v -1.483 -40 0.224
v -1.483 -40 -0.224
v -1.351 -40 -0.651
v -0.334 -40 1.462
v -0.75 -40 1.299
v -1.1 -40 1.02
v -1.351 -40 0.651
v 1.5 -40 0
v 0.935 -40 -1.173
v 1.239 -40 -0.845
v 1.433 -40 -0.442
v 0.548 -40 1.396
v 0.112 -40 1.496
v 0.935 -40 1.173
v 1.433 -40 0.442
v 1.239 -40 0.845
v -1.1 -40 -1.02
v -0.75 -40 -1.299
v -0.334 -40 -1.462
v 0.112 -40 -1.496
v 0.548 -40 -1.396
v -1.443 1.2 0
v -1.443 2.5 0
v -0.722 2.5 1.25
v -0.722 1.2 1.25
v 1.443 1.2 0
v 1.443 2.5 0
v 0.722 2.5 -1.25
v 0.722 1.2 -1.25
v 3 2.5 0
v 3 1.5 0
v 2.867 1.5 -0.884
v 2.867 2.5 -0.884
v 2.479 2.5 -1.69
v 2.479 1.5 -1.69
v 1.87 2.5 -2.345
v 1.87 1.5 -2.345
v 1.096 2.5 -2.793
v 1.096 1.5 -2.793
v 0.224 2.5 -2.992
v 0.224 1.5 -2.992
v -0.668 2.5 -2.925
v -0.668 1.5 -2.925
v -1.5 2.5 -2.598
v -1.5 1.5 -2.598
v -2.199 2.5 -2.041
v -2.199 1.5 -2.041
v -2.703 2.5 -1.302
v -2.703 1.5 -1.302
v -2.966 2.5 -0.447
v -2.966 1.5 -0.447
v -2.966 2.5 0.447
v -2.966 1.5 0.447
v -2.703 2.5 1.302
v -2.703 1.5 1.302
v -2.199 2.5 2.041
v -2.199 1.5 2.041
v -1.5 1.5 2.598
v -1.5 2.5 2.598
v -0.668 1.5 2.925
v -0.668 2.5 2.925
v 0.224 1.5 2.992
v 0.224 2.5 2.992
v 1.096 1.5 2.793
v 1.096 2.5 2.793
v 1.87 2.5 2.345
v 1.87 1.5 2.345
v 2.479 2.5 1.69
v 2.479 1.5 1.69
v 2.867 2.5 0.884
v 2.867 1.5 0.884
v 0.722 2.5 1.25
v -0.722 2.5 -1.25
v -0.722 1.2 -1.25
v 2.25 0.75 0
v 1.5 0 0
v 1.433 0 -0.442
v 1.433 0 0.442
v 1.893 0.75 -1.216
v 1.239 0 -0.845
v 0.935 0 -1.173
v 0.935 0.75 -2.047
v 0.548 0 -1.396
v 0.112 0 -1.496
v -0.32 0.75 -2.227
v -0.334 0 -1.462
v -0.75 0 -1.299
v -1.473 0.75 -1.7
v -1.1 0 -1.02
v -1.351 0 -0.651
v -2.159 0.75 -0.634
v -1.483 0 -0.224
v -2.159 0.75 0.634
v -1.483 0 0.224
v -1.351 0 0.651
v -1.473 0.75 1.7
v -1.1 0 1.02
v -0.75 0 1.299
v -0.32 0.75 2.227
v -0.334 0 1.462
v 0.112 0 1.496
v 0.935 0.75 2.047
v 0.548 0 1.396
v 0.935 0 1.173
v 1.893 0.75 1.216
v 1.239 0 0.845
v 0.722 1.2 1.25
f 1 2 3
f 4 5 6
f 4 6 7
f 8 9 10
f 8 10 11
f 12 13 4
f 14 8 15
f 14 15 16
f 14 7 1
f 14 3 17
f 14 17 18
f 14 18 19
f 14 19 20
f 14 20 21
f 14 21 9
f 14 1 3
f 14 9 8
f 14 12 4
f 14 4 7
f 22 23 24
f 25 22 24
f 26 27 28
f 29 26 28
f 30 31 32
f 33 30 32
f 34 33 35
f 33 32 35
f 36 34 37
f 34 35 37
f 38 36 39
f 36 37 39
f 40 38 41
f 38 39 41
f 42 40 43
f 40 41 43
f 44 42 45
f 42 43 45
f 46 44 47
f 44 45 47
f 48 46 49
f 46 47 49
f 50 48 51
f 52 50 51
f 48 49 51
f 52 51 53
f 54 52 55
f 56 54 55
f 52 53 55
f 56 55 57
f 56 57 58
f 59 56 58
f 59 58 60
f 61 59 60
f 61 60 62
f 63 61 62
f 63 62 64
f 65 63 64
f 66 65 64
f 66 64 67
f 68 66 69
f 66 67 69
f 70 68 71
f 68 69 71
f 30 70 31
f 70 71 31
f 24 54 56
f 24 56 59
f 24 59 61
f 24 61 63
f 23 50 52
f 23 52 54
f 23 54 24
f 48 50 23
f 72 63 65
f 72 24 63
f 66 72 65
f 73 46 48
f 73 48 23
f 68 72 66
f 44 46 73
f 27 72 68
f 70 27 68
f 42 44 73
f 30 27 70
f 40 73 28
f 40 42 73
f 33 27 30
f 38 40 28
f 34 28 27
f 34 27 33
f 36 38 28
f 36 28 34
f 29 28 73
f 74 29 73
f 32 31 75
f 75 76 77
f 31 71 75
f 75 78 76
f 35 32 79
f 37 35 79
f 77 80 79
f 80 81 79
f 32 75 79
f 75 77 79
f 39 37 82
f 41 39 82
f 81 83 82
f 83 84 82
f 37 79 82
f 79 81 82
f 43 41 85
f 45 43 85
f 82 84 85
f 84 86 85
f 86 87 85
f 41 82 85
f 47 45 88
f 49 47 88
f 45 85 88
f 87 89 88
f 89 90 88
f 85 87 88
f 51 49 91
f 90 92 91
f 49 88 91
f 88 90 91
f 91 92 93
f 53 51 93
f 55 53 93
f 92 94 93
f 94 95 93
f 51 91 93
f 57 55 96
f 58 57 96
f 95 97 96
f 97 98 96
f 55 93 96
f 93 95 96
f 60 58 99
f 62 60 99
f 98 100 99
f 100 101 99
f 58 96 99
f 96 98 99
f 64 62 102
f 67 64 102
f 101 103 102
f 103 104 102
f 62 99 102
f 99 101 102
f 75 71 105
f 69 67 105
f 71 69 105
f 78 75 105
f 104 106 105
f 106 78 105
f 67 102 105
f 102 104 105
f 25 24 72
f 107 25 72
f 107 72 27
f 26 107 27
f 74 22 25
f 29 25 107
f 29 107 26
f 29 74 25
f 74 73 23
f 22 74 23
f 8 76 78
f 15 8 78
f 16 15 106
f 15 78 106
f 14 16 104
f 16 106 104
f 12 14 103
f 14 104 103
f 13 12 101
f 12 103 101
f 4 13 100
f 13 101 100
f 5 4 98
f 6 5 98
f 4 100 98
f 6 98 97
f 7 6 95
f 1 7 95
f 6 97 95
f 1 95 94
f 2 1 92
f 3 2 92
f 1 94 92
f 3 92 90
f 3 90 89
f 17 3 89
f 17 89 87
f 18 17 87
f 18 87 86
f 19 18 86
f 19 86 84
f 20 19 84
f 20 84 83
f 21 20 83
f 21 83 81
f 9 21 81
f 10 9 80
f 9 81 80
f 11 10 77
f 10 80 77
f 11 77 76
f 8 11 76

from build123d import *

# Parameters (mm, degrees)
SKETCH_1_R            = 3
EXTRUDE_251_DEPTH     = 2.5
CHAMFER_1_SIZE        = 1.5
CUT_EXTRUDE_459_DEPTH = 1.3
SKETCH_3_R            = 1.5
EXTRUDE_571_DEPTH     = 40


with BuildPart() as part:
    # 草图1 → Extrude 251 (new body)
    with BuildSketch(Plane(origin=(0, 0, 0), x_dir=(1, 0, 0), z_dir=(0, 1, 0))):
        Circle(SKETCH_1_R)
    extrude(amount=EXTRUDE_251_DEPTH)

    # 倒角1
    chamfer_1_edges = [part.edges().sort_by_distance(p)[0] for p in [
        (-3, 0, 0),
    ]]
    chamfer(chamfer_1_edges, length=CHAMFER_1_SIZE)

    # 草图2 → Cut-Extrude 459 (cut)
    with BuildSketch(Plane(origin=(0, 2.5, 0), x_dir=(1, 0, 0), z_dir=(0, 1, 0))):
        Polygon((1.443375673, 0), (0.721687836, 1.25), (-0.721687836, 1.25), (-1.443375673, 0), (-0.721687836, -1.25), (0.721687836, -1.25), align=None)
    extrude(amount=-CUT_EXTRUDE_459_DEPTH, mode=Mode.SUBTRACT)

    # 草图3 → Extrude 571 (add)
    with BuildSketch(Plane.XZ):
        Circle(SKETCH_3_R)
    extrude(amount=EXTRUDE_571_DEPTH)


solid = part.part
